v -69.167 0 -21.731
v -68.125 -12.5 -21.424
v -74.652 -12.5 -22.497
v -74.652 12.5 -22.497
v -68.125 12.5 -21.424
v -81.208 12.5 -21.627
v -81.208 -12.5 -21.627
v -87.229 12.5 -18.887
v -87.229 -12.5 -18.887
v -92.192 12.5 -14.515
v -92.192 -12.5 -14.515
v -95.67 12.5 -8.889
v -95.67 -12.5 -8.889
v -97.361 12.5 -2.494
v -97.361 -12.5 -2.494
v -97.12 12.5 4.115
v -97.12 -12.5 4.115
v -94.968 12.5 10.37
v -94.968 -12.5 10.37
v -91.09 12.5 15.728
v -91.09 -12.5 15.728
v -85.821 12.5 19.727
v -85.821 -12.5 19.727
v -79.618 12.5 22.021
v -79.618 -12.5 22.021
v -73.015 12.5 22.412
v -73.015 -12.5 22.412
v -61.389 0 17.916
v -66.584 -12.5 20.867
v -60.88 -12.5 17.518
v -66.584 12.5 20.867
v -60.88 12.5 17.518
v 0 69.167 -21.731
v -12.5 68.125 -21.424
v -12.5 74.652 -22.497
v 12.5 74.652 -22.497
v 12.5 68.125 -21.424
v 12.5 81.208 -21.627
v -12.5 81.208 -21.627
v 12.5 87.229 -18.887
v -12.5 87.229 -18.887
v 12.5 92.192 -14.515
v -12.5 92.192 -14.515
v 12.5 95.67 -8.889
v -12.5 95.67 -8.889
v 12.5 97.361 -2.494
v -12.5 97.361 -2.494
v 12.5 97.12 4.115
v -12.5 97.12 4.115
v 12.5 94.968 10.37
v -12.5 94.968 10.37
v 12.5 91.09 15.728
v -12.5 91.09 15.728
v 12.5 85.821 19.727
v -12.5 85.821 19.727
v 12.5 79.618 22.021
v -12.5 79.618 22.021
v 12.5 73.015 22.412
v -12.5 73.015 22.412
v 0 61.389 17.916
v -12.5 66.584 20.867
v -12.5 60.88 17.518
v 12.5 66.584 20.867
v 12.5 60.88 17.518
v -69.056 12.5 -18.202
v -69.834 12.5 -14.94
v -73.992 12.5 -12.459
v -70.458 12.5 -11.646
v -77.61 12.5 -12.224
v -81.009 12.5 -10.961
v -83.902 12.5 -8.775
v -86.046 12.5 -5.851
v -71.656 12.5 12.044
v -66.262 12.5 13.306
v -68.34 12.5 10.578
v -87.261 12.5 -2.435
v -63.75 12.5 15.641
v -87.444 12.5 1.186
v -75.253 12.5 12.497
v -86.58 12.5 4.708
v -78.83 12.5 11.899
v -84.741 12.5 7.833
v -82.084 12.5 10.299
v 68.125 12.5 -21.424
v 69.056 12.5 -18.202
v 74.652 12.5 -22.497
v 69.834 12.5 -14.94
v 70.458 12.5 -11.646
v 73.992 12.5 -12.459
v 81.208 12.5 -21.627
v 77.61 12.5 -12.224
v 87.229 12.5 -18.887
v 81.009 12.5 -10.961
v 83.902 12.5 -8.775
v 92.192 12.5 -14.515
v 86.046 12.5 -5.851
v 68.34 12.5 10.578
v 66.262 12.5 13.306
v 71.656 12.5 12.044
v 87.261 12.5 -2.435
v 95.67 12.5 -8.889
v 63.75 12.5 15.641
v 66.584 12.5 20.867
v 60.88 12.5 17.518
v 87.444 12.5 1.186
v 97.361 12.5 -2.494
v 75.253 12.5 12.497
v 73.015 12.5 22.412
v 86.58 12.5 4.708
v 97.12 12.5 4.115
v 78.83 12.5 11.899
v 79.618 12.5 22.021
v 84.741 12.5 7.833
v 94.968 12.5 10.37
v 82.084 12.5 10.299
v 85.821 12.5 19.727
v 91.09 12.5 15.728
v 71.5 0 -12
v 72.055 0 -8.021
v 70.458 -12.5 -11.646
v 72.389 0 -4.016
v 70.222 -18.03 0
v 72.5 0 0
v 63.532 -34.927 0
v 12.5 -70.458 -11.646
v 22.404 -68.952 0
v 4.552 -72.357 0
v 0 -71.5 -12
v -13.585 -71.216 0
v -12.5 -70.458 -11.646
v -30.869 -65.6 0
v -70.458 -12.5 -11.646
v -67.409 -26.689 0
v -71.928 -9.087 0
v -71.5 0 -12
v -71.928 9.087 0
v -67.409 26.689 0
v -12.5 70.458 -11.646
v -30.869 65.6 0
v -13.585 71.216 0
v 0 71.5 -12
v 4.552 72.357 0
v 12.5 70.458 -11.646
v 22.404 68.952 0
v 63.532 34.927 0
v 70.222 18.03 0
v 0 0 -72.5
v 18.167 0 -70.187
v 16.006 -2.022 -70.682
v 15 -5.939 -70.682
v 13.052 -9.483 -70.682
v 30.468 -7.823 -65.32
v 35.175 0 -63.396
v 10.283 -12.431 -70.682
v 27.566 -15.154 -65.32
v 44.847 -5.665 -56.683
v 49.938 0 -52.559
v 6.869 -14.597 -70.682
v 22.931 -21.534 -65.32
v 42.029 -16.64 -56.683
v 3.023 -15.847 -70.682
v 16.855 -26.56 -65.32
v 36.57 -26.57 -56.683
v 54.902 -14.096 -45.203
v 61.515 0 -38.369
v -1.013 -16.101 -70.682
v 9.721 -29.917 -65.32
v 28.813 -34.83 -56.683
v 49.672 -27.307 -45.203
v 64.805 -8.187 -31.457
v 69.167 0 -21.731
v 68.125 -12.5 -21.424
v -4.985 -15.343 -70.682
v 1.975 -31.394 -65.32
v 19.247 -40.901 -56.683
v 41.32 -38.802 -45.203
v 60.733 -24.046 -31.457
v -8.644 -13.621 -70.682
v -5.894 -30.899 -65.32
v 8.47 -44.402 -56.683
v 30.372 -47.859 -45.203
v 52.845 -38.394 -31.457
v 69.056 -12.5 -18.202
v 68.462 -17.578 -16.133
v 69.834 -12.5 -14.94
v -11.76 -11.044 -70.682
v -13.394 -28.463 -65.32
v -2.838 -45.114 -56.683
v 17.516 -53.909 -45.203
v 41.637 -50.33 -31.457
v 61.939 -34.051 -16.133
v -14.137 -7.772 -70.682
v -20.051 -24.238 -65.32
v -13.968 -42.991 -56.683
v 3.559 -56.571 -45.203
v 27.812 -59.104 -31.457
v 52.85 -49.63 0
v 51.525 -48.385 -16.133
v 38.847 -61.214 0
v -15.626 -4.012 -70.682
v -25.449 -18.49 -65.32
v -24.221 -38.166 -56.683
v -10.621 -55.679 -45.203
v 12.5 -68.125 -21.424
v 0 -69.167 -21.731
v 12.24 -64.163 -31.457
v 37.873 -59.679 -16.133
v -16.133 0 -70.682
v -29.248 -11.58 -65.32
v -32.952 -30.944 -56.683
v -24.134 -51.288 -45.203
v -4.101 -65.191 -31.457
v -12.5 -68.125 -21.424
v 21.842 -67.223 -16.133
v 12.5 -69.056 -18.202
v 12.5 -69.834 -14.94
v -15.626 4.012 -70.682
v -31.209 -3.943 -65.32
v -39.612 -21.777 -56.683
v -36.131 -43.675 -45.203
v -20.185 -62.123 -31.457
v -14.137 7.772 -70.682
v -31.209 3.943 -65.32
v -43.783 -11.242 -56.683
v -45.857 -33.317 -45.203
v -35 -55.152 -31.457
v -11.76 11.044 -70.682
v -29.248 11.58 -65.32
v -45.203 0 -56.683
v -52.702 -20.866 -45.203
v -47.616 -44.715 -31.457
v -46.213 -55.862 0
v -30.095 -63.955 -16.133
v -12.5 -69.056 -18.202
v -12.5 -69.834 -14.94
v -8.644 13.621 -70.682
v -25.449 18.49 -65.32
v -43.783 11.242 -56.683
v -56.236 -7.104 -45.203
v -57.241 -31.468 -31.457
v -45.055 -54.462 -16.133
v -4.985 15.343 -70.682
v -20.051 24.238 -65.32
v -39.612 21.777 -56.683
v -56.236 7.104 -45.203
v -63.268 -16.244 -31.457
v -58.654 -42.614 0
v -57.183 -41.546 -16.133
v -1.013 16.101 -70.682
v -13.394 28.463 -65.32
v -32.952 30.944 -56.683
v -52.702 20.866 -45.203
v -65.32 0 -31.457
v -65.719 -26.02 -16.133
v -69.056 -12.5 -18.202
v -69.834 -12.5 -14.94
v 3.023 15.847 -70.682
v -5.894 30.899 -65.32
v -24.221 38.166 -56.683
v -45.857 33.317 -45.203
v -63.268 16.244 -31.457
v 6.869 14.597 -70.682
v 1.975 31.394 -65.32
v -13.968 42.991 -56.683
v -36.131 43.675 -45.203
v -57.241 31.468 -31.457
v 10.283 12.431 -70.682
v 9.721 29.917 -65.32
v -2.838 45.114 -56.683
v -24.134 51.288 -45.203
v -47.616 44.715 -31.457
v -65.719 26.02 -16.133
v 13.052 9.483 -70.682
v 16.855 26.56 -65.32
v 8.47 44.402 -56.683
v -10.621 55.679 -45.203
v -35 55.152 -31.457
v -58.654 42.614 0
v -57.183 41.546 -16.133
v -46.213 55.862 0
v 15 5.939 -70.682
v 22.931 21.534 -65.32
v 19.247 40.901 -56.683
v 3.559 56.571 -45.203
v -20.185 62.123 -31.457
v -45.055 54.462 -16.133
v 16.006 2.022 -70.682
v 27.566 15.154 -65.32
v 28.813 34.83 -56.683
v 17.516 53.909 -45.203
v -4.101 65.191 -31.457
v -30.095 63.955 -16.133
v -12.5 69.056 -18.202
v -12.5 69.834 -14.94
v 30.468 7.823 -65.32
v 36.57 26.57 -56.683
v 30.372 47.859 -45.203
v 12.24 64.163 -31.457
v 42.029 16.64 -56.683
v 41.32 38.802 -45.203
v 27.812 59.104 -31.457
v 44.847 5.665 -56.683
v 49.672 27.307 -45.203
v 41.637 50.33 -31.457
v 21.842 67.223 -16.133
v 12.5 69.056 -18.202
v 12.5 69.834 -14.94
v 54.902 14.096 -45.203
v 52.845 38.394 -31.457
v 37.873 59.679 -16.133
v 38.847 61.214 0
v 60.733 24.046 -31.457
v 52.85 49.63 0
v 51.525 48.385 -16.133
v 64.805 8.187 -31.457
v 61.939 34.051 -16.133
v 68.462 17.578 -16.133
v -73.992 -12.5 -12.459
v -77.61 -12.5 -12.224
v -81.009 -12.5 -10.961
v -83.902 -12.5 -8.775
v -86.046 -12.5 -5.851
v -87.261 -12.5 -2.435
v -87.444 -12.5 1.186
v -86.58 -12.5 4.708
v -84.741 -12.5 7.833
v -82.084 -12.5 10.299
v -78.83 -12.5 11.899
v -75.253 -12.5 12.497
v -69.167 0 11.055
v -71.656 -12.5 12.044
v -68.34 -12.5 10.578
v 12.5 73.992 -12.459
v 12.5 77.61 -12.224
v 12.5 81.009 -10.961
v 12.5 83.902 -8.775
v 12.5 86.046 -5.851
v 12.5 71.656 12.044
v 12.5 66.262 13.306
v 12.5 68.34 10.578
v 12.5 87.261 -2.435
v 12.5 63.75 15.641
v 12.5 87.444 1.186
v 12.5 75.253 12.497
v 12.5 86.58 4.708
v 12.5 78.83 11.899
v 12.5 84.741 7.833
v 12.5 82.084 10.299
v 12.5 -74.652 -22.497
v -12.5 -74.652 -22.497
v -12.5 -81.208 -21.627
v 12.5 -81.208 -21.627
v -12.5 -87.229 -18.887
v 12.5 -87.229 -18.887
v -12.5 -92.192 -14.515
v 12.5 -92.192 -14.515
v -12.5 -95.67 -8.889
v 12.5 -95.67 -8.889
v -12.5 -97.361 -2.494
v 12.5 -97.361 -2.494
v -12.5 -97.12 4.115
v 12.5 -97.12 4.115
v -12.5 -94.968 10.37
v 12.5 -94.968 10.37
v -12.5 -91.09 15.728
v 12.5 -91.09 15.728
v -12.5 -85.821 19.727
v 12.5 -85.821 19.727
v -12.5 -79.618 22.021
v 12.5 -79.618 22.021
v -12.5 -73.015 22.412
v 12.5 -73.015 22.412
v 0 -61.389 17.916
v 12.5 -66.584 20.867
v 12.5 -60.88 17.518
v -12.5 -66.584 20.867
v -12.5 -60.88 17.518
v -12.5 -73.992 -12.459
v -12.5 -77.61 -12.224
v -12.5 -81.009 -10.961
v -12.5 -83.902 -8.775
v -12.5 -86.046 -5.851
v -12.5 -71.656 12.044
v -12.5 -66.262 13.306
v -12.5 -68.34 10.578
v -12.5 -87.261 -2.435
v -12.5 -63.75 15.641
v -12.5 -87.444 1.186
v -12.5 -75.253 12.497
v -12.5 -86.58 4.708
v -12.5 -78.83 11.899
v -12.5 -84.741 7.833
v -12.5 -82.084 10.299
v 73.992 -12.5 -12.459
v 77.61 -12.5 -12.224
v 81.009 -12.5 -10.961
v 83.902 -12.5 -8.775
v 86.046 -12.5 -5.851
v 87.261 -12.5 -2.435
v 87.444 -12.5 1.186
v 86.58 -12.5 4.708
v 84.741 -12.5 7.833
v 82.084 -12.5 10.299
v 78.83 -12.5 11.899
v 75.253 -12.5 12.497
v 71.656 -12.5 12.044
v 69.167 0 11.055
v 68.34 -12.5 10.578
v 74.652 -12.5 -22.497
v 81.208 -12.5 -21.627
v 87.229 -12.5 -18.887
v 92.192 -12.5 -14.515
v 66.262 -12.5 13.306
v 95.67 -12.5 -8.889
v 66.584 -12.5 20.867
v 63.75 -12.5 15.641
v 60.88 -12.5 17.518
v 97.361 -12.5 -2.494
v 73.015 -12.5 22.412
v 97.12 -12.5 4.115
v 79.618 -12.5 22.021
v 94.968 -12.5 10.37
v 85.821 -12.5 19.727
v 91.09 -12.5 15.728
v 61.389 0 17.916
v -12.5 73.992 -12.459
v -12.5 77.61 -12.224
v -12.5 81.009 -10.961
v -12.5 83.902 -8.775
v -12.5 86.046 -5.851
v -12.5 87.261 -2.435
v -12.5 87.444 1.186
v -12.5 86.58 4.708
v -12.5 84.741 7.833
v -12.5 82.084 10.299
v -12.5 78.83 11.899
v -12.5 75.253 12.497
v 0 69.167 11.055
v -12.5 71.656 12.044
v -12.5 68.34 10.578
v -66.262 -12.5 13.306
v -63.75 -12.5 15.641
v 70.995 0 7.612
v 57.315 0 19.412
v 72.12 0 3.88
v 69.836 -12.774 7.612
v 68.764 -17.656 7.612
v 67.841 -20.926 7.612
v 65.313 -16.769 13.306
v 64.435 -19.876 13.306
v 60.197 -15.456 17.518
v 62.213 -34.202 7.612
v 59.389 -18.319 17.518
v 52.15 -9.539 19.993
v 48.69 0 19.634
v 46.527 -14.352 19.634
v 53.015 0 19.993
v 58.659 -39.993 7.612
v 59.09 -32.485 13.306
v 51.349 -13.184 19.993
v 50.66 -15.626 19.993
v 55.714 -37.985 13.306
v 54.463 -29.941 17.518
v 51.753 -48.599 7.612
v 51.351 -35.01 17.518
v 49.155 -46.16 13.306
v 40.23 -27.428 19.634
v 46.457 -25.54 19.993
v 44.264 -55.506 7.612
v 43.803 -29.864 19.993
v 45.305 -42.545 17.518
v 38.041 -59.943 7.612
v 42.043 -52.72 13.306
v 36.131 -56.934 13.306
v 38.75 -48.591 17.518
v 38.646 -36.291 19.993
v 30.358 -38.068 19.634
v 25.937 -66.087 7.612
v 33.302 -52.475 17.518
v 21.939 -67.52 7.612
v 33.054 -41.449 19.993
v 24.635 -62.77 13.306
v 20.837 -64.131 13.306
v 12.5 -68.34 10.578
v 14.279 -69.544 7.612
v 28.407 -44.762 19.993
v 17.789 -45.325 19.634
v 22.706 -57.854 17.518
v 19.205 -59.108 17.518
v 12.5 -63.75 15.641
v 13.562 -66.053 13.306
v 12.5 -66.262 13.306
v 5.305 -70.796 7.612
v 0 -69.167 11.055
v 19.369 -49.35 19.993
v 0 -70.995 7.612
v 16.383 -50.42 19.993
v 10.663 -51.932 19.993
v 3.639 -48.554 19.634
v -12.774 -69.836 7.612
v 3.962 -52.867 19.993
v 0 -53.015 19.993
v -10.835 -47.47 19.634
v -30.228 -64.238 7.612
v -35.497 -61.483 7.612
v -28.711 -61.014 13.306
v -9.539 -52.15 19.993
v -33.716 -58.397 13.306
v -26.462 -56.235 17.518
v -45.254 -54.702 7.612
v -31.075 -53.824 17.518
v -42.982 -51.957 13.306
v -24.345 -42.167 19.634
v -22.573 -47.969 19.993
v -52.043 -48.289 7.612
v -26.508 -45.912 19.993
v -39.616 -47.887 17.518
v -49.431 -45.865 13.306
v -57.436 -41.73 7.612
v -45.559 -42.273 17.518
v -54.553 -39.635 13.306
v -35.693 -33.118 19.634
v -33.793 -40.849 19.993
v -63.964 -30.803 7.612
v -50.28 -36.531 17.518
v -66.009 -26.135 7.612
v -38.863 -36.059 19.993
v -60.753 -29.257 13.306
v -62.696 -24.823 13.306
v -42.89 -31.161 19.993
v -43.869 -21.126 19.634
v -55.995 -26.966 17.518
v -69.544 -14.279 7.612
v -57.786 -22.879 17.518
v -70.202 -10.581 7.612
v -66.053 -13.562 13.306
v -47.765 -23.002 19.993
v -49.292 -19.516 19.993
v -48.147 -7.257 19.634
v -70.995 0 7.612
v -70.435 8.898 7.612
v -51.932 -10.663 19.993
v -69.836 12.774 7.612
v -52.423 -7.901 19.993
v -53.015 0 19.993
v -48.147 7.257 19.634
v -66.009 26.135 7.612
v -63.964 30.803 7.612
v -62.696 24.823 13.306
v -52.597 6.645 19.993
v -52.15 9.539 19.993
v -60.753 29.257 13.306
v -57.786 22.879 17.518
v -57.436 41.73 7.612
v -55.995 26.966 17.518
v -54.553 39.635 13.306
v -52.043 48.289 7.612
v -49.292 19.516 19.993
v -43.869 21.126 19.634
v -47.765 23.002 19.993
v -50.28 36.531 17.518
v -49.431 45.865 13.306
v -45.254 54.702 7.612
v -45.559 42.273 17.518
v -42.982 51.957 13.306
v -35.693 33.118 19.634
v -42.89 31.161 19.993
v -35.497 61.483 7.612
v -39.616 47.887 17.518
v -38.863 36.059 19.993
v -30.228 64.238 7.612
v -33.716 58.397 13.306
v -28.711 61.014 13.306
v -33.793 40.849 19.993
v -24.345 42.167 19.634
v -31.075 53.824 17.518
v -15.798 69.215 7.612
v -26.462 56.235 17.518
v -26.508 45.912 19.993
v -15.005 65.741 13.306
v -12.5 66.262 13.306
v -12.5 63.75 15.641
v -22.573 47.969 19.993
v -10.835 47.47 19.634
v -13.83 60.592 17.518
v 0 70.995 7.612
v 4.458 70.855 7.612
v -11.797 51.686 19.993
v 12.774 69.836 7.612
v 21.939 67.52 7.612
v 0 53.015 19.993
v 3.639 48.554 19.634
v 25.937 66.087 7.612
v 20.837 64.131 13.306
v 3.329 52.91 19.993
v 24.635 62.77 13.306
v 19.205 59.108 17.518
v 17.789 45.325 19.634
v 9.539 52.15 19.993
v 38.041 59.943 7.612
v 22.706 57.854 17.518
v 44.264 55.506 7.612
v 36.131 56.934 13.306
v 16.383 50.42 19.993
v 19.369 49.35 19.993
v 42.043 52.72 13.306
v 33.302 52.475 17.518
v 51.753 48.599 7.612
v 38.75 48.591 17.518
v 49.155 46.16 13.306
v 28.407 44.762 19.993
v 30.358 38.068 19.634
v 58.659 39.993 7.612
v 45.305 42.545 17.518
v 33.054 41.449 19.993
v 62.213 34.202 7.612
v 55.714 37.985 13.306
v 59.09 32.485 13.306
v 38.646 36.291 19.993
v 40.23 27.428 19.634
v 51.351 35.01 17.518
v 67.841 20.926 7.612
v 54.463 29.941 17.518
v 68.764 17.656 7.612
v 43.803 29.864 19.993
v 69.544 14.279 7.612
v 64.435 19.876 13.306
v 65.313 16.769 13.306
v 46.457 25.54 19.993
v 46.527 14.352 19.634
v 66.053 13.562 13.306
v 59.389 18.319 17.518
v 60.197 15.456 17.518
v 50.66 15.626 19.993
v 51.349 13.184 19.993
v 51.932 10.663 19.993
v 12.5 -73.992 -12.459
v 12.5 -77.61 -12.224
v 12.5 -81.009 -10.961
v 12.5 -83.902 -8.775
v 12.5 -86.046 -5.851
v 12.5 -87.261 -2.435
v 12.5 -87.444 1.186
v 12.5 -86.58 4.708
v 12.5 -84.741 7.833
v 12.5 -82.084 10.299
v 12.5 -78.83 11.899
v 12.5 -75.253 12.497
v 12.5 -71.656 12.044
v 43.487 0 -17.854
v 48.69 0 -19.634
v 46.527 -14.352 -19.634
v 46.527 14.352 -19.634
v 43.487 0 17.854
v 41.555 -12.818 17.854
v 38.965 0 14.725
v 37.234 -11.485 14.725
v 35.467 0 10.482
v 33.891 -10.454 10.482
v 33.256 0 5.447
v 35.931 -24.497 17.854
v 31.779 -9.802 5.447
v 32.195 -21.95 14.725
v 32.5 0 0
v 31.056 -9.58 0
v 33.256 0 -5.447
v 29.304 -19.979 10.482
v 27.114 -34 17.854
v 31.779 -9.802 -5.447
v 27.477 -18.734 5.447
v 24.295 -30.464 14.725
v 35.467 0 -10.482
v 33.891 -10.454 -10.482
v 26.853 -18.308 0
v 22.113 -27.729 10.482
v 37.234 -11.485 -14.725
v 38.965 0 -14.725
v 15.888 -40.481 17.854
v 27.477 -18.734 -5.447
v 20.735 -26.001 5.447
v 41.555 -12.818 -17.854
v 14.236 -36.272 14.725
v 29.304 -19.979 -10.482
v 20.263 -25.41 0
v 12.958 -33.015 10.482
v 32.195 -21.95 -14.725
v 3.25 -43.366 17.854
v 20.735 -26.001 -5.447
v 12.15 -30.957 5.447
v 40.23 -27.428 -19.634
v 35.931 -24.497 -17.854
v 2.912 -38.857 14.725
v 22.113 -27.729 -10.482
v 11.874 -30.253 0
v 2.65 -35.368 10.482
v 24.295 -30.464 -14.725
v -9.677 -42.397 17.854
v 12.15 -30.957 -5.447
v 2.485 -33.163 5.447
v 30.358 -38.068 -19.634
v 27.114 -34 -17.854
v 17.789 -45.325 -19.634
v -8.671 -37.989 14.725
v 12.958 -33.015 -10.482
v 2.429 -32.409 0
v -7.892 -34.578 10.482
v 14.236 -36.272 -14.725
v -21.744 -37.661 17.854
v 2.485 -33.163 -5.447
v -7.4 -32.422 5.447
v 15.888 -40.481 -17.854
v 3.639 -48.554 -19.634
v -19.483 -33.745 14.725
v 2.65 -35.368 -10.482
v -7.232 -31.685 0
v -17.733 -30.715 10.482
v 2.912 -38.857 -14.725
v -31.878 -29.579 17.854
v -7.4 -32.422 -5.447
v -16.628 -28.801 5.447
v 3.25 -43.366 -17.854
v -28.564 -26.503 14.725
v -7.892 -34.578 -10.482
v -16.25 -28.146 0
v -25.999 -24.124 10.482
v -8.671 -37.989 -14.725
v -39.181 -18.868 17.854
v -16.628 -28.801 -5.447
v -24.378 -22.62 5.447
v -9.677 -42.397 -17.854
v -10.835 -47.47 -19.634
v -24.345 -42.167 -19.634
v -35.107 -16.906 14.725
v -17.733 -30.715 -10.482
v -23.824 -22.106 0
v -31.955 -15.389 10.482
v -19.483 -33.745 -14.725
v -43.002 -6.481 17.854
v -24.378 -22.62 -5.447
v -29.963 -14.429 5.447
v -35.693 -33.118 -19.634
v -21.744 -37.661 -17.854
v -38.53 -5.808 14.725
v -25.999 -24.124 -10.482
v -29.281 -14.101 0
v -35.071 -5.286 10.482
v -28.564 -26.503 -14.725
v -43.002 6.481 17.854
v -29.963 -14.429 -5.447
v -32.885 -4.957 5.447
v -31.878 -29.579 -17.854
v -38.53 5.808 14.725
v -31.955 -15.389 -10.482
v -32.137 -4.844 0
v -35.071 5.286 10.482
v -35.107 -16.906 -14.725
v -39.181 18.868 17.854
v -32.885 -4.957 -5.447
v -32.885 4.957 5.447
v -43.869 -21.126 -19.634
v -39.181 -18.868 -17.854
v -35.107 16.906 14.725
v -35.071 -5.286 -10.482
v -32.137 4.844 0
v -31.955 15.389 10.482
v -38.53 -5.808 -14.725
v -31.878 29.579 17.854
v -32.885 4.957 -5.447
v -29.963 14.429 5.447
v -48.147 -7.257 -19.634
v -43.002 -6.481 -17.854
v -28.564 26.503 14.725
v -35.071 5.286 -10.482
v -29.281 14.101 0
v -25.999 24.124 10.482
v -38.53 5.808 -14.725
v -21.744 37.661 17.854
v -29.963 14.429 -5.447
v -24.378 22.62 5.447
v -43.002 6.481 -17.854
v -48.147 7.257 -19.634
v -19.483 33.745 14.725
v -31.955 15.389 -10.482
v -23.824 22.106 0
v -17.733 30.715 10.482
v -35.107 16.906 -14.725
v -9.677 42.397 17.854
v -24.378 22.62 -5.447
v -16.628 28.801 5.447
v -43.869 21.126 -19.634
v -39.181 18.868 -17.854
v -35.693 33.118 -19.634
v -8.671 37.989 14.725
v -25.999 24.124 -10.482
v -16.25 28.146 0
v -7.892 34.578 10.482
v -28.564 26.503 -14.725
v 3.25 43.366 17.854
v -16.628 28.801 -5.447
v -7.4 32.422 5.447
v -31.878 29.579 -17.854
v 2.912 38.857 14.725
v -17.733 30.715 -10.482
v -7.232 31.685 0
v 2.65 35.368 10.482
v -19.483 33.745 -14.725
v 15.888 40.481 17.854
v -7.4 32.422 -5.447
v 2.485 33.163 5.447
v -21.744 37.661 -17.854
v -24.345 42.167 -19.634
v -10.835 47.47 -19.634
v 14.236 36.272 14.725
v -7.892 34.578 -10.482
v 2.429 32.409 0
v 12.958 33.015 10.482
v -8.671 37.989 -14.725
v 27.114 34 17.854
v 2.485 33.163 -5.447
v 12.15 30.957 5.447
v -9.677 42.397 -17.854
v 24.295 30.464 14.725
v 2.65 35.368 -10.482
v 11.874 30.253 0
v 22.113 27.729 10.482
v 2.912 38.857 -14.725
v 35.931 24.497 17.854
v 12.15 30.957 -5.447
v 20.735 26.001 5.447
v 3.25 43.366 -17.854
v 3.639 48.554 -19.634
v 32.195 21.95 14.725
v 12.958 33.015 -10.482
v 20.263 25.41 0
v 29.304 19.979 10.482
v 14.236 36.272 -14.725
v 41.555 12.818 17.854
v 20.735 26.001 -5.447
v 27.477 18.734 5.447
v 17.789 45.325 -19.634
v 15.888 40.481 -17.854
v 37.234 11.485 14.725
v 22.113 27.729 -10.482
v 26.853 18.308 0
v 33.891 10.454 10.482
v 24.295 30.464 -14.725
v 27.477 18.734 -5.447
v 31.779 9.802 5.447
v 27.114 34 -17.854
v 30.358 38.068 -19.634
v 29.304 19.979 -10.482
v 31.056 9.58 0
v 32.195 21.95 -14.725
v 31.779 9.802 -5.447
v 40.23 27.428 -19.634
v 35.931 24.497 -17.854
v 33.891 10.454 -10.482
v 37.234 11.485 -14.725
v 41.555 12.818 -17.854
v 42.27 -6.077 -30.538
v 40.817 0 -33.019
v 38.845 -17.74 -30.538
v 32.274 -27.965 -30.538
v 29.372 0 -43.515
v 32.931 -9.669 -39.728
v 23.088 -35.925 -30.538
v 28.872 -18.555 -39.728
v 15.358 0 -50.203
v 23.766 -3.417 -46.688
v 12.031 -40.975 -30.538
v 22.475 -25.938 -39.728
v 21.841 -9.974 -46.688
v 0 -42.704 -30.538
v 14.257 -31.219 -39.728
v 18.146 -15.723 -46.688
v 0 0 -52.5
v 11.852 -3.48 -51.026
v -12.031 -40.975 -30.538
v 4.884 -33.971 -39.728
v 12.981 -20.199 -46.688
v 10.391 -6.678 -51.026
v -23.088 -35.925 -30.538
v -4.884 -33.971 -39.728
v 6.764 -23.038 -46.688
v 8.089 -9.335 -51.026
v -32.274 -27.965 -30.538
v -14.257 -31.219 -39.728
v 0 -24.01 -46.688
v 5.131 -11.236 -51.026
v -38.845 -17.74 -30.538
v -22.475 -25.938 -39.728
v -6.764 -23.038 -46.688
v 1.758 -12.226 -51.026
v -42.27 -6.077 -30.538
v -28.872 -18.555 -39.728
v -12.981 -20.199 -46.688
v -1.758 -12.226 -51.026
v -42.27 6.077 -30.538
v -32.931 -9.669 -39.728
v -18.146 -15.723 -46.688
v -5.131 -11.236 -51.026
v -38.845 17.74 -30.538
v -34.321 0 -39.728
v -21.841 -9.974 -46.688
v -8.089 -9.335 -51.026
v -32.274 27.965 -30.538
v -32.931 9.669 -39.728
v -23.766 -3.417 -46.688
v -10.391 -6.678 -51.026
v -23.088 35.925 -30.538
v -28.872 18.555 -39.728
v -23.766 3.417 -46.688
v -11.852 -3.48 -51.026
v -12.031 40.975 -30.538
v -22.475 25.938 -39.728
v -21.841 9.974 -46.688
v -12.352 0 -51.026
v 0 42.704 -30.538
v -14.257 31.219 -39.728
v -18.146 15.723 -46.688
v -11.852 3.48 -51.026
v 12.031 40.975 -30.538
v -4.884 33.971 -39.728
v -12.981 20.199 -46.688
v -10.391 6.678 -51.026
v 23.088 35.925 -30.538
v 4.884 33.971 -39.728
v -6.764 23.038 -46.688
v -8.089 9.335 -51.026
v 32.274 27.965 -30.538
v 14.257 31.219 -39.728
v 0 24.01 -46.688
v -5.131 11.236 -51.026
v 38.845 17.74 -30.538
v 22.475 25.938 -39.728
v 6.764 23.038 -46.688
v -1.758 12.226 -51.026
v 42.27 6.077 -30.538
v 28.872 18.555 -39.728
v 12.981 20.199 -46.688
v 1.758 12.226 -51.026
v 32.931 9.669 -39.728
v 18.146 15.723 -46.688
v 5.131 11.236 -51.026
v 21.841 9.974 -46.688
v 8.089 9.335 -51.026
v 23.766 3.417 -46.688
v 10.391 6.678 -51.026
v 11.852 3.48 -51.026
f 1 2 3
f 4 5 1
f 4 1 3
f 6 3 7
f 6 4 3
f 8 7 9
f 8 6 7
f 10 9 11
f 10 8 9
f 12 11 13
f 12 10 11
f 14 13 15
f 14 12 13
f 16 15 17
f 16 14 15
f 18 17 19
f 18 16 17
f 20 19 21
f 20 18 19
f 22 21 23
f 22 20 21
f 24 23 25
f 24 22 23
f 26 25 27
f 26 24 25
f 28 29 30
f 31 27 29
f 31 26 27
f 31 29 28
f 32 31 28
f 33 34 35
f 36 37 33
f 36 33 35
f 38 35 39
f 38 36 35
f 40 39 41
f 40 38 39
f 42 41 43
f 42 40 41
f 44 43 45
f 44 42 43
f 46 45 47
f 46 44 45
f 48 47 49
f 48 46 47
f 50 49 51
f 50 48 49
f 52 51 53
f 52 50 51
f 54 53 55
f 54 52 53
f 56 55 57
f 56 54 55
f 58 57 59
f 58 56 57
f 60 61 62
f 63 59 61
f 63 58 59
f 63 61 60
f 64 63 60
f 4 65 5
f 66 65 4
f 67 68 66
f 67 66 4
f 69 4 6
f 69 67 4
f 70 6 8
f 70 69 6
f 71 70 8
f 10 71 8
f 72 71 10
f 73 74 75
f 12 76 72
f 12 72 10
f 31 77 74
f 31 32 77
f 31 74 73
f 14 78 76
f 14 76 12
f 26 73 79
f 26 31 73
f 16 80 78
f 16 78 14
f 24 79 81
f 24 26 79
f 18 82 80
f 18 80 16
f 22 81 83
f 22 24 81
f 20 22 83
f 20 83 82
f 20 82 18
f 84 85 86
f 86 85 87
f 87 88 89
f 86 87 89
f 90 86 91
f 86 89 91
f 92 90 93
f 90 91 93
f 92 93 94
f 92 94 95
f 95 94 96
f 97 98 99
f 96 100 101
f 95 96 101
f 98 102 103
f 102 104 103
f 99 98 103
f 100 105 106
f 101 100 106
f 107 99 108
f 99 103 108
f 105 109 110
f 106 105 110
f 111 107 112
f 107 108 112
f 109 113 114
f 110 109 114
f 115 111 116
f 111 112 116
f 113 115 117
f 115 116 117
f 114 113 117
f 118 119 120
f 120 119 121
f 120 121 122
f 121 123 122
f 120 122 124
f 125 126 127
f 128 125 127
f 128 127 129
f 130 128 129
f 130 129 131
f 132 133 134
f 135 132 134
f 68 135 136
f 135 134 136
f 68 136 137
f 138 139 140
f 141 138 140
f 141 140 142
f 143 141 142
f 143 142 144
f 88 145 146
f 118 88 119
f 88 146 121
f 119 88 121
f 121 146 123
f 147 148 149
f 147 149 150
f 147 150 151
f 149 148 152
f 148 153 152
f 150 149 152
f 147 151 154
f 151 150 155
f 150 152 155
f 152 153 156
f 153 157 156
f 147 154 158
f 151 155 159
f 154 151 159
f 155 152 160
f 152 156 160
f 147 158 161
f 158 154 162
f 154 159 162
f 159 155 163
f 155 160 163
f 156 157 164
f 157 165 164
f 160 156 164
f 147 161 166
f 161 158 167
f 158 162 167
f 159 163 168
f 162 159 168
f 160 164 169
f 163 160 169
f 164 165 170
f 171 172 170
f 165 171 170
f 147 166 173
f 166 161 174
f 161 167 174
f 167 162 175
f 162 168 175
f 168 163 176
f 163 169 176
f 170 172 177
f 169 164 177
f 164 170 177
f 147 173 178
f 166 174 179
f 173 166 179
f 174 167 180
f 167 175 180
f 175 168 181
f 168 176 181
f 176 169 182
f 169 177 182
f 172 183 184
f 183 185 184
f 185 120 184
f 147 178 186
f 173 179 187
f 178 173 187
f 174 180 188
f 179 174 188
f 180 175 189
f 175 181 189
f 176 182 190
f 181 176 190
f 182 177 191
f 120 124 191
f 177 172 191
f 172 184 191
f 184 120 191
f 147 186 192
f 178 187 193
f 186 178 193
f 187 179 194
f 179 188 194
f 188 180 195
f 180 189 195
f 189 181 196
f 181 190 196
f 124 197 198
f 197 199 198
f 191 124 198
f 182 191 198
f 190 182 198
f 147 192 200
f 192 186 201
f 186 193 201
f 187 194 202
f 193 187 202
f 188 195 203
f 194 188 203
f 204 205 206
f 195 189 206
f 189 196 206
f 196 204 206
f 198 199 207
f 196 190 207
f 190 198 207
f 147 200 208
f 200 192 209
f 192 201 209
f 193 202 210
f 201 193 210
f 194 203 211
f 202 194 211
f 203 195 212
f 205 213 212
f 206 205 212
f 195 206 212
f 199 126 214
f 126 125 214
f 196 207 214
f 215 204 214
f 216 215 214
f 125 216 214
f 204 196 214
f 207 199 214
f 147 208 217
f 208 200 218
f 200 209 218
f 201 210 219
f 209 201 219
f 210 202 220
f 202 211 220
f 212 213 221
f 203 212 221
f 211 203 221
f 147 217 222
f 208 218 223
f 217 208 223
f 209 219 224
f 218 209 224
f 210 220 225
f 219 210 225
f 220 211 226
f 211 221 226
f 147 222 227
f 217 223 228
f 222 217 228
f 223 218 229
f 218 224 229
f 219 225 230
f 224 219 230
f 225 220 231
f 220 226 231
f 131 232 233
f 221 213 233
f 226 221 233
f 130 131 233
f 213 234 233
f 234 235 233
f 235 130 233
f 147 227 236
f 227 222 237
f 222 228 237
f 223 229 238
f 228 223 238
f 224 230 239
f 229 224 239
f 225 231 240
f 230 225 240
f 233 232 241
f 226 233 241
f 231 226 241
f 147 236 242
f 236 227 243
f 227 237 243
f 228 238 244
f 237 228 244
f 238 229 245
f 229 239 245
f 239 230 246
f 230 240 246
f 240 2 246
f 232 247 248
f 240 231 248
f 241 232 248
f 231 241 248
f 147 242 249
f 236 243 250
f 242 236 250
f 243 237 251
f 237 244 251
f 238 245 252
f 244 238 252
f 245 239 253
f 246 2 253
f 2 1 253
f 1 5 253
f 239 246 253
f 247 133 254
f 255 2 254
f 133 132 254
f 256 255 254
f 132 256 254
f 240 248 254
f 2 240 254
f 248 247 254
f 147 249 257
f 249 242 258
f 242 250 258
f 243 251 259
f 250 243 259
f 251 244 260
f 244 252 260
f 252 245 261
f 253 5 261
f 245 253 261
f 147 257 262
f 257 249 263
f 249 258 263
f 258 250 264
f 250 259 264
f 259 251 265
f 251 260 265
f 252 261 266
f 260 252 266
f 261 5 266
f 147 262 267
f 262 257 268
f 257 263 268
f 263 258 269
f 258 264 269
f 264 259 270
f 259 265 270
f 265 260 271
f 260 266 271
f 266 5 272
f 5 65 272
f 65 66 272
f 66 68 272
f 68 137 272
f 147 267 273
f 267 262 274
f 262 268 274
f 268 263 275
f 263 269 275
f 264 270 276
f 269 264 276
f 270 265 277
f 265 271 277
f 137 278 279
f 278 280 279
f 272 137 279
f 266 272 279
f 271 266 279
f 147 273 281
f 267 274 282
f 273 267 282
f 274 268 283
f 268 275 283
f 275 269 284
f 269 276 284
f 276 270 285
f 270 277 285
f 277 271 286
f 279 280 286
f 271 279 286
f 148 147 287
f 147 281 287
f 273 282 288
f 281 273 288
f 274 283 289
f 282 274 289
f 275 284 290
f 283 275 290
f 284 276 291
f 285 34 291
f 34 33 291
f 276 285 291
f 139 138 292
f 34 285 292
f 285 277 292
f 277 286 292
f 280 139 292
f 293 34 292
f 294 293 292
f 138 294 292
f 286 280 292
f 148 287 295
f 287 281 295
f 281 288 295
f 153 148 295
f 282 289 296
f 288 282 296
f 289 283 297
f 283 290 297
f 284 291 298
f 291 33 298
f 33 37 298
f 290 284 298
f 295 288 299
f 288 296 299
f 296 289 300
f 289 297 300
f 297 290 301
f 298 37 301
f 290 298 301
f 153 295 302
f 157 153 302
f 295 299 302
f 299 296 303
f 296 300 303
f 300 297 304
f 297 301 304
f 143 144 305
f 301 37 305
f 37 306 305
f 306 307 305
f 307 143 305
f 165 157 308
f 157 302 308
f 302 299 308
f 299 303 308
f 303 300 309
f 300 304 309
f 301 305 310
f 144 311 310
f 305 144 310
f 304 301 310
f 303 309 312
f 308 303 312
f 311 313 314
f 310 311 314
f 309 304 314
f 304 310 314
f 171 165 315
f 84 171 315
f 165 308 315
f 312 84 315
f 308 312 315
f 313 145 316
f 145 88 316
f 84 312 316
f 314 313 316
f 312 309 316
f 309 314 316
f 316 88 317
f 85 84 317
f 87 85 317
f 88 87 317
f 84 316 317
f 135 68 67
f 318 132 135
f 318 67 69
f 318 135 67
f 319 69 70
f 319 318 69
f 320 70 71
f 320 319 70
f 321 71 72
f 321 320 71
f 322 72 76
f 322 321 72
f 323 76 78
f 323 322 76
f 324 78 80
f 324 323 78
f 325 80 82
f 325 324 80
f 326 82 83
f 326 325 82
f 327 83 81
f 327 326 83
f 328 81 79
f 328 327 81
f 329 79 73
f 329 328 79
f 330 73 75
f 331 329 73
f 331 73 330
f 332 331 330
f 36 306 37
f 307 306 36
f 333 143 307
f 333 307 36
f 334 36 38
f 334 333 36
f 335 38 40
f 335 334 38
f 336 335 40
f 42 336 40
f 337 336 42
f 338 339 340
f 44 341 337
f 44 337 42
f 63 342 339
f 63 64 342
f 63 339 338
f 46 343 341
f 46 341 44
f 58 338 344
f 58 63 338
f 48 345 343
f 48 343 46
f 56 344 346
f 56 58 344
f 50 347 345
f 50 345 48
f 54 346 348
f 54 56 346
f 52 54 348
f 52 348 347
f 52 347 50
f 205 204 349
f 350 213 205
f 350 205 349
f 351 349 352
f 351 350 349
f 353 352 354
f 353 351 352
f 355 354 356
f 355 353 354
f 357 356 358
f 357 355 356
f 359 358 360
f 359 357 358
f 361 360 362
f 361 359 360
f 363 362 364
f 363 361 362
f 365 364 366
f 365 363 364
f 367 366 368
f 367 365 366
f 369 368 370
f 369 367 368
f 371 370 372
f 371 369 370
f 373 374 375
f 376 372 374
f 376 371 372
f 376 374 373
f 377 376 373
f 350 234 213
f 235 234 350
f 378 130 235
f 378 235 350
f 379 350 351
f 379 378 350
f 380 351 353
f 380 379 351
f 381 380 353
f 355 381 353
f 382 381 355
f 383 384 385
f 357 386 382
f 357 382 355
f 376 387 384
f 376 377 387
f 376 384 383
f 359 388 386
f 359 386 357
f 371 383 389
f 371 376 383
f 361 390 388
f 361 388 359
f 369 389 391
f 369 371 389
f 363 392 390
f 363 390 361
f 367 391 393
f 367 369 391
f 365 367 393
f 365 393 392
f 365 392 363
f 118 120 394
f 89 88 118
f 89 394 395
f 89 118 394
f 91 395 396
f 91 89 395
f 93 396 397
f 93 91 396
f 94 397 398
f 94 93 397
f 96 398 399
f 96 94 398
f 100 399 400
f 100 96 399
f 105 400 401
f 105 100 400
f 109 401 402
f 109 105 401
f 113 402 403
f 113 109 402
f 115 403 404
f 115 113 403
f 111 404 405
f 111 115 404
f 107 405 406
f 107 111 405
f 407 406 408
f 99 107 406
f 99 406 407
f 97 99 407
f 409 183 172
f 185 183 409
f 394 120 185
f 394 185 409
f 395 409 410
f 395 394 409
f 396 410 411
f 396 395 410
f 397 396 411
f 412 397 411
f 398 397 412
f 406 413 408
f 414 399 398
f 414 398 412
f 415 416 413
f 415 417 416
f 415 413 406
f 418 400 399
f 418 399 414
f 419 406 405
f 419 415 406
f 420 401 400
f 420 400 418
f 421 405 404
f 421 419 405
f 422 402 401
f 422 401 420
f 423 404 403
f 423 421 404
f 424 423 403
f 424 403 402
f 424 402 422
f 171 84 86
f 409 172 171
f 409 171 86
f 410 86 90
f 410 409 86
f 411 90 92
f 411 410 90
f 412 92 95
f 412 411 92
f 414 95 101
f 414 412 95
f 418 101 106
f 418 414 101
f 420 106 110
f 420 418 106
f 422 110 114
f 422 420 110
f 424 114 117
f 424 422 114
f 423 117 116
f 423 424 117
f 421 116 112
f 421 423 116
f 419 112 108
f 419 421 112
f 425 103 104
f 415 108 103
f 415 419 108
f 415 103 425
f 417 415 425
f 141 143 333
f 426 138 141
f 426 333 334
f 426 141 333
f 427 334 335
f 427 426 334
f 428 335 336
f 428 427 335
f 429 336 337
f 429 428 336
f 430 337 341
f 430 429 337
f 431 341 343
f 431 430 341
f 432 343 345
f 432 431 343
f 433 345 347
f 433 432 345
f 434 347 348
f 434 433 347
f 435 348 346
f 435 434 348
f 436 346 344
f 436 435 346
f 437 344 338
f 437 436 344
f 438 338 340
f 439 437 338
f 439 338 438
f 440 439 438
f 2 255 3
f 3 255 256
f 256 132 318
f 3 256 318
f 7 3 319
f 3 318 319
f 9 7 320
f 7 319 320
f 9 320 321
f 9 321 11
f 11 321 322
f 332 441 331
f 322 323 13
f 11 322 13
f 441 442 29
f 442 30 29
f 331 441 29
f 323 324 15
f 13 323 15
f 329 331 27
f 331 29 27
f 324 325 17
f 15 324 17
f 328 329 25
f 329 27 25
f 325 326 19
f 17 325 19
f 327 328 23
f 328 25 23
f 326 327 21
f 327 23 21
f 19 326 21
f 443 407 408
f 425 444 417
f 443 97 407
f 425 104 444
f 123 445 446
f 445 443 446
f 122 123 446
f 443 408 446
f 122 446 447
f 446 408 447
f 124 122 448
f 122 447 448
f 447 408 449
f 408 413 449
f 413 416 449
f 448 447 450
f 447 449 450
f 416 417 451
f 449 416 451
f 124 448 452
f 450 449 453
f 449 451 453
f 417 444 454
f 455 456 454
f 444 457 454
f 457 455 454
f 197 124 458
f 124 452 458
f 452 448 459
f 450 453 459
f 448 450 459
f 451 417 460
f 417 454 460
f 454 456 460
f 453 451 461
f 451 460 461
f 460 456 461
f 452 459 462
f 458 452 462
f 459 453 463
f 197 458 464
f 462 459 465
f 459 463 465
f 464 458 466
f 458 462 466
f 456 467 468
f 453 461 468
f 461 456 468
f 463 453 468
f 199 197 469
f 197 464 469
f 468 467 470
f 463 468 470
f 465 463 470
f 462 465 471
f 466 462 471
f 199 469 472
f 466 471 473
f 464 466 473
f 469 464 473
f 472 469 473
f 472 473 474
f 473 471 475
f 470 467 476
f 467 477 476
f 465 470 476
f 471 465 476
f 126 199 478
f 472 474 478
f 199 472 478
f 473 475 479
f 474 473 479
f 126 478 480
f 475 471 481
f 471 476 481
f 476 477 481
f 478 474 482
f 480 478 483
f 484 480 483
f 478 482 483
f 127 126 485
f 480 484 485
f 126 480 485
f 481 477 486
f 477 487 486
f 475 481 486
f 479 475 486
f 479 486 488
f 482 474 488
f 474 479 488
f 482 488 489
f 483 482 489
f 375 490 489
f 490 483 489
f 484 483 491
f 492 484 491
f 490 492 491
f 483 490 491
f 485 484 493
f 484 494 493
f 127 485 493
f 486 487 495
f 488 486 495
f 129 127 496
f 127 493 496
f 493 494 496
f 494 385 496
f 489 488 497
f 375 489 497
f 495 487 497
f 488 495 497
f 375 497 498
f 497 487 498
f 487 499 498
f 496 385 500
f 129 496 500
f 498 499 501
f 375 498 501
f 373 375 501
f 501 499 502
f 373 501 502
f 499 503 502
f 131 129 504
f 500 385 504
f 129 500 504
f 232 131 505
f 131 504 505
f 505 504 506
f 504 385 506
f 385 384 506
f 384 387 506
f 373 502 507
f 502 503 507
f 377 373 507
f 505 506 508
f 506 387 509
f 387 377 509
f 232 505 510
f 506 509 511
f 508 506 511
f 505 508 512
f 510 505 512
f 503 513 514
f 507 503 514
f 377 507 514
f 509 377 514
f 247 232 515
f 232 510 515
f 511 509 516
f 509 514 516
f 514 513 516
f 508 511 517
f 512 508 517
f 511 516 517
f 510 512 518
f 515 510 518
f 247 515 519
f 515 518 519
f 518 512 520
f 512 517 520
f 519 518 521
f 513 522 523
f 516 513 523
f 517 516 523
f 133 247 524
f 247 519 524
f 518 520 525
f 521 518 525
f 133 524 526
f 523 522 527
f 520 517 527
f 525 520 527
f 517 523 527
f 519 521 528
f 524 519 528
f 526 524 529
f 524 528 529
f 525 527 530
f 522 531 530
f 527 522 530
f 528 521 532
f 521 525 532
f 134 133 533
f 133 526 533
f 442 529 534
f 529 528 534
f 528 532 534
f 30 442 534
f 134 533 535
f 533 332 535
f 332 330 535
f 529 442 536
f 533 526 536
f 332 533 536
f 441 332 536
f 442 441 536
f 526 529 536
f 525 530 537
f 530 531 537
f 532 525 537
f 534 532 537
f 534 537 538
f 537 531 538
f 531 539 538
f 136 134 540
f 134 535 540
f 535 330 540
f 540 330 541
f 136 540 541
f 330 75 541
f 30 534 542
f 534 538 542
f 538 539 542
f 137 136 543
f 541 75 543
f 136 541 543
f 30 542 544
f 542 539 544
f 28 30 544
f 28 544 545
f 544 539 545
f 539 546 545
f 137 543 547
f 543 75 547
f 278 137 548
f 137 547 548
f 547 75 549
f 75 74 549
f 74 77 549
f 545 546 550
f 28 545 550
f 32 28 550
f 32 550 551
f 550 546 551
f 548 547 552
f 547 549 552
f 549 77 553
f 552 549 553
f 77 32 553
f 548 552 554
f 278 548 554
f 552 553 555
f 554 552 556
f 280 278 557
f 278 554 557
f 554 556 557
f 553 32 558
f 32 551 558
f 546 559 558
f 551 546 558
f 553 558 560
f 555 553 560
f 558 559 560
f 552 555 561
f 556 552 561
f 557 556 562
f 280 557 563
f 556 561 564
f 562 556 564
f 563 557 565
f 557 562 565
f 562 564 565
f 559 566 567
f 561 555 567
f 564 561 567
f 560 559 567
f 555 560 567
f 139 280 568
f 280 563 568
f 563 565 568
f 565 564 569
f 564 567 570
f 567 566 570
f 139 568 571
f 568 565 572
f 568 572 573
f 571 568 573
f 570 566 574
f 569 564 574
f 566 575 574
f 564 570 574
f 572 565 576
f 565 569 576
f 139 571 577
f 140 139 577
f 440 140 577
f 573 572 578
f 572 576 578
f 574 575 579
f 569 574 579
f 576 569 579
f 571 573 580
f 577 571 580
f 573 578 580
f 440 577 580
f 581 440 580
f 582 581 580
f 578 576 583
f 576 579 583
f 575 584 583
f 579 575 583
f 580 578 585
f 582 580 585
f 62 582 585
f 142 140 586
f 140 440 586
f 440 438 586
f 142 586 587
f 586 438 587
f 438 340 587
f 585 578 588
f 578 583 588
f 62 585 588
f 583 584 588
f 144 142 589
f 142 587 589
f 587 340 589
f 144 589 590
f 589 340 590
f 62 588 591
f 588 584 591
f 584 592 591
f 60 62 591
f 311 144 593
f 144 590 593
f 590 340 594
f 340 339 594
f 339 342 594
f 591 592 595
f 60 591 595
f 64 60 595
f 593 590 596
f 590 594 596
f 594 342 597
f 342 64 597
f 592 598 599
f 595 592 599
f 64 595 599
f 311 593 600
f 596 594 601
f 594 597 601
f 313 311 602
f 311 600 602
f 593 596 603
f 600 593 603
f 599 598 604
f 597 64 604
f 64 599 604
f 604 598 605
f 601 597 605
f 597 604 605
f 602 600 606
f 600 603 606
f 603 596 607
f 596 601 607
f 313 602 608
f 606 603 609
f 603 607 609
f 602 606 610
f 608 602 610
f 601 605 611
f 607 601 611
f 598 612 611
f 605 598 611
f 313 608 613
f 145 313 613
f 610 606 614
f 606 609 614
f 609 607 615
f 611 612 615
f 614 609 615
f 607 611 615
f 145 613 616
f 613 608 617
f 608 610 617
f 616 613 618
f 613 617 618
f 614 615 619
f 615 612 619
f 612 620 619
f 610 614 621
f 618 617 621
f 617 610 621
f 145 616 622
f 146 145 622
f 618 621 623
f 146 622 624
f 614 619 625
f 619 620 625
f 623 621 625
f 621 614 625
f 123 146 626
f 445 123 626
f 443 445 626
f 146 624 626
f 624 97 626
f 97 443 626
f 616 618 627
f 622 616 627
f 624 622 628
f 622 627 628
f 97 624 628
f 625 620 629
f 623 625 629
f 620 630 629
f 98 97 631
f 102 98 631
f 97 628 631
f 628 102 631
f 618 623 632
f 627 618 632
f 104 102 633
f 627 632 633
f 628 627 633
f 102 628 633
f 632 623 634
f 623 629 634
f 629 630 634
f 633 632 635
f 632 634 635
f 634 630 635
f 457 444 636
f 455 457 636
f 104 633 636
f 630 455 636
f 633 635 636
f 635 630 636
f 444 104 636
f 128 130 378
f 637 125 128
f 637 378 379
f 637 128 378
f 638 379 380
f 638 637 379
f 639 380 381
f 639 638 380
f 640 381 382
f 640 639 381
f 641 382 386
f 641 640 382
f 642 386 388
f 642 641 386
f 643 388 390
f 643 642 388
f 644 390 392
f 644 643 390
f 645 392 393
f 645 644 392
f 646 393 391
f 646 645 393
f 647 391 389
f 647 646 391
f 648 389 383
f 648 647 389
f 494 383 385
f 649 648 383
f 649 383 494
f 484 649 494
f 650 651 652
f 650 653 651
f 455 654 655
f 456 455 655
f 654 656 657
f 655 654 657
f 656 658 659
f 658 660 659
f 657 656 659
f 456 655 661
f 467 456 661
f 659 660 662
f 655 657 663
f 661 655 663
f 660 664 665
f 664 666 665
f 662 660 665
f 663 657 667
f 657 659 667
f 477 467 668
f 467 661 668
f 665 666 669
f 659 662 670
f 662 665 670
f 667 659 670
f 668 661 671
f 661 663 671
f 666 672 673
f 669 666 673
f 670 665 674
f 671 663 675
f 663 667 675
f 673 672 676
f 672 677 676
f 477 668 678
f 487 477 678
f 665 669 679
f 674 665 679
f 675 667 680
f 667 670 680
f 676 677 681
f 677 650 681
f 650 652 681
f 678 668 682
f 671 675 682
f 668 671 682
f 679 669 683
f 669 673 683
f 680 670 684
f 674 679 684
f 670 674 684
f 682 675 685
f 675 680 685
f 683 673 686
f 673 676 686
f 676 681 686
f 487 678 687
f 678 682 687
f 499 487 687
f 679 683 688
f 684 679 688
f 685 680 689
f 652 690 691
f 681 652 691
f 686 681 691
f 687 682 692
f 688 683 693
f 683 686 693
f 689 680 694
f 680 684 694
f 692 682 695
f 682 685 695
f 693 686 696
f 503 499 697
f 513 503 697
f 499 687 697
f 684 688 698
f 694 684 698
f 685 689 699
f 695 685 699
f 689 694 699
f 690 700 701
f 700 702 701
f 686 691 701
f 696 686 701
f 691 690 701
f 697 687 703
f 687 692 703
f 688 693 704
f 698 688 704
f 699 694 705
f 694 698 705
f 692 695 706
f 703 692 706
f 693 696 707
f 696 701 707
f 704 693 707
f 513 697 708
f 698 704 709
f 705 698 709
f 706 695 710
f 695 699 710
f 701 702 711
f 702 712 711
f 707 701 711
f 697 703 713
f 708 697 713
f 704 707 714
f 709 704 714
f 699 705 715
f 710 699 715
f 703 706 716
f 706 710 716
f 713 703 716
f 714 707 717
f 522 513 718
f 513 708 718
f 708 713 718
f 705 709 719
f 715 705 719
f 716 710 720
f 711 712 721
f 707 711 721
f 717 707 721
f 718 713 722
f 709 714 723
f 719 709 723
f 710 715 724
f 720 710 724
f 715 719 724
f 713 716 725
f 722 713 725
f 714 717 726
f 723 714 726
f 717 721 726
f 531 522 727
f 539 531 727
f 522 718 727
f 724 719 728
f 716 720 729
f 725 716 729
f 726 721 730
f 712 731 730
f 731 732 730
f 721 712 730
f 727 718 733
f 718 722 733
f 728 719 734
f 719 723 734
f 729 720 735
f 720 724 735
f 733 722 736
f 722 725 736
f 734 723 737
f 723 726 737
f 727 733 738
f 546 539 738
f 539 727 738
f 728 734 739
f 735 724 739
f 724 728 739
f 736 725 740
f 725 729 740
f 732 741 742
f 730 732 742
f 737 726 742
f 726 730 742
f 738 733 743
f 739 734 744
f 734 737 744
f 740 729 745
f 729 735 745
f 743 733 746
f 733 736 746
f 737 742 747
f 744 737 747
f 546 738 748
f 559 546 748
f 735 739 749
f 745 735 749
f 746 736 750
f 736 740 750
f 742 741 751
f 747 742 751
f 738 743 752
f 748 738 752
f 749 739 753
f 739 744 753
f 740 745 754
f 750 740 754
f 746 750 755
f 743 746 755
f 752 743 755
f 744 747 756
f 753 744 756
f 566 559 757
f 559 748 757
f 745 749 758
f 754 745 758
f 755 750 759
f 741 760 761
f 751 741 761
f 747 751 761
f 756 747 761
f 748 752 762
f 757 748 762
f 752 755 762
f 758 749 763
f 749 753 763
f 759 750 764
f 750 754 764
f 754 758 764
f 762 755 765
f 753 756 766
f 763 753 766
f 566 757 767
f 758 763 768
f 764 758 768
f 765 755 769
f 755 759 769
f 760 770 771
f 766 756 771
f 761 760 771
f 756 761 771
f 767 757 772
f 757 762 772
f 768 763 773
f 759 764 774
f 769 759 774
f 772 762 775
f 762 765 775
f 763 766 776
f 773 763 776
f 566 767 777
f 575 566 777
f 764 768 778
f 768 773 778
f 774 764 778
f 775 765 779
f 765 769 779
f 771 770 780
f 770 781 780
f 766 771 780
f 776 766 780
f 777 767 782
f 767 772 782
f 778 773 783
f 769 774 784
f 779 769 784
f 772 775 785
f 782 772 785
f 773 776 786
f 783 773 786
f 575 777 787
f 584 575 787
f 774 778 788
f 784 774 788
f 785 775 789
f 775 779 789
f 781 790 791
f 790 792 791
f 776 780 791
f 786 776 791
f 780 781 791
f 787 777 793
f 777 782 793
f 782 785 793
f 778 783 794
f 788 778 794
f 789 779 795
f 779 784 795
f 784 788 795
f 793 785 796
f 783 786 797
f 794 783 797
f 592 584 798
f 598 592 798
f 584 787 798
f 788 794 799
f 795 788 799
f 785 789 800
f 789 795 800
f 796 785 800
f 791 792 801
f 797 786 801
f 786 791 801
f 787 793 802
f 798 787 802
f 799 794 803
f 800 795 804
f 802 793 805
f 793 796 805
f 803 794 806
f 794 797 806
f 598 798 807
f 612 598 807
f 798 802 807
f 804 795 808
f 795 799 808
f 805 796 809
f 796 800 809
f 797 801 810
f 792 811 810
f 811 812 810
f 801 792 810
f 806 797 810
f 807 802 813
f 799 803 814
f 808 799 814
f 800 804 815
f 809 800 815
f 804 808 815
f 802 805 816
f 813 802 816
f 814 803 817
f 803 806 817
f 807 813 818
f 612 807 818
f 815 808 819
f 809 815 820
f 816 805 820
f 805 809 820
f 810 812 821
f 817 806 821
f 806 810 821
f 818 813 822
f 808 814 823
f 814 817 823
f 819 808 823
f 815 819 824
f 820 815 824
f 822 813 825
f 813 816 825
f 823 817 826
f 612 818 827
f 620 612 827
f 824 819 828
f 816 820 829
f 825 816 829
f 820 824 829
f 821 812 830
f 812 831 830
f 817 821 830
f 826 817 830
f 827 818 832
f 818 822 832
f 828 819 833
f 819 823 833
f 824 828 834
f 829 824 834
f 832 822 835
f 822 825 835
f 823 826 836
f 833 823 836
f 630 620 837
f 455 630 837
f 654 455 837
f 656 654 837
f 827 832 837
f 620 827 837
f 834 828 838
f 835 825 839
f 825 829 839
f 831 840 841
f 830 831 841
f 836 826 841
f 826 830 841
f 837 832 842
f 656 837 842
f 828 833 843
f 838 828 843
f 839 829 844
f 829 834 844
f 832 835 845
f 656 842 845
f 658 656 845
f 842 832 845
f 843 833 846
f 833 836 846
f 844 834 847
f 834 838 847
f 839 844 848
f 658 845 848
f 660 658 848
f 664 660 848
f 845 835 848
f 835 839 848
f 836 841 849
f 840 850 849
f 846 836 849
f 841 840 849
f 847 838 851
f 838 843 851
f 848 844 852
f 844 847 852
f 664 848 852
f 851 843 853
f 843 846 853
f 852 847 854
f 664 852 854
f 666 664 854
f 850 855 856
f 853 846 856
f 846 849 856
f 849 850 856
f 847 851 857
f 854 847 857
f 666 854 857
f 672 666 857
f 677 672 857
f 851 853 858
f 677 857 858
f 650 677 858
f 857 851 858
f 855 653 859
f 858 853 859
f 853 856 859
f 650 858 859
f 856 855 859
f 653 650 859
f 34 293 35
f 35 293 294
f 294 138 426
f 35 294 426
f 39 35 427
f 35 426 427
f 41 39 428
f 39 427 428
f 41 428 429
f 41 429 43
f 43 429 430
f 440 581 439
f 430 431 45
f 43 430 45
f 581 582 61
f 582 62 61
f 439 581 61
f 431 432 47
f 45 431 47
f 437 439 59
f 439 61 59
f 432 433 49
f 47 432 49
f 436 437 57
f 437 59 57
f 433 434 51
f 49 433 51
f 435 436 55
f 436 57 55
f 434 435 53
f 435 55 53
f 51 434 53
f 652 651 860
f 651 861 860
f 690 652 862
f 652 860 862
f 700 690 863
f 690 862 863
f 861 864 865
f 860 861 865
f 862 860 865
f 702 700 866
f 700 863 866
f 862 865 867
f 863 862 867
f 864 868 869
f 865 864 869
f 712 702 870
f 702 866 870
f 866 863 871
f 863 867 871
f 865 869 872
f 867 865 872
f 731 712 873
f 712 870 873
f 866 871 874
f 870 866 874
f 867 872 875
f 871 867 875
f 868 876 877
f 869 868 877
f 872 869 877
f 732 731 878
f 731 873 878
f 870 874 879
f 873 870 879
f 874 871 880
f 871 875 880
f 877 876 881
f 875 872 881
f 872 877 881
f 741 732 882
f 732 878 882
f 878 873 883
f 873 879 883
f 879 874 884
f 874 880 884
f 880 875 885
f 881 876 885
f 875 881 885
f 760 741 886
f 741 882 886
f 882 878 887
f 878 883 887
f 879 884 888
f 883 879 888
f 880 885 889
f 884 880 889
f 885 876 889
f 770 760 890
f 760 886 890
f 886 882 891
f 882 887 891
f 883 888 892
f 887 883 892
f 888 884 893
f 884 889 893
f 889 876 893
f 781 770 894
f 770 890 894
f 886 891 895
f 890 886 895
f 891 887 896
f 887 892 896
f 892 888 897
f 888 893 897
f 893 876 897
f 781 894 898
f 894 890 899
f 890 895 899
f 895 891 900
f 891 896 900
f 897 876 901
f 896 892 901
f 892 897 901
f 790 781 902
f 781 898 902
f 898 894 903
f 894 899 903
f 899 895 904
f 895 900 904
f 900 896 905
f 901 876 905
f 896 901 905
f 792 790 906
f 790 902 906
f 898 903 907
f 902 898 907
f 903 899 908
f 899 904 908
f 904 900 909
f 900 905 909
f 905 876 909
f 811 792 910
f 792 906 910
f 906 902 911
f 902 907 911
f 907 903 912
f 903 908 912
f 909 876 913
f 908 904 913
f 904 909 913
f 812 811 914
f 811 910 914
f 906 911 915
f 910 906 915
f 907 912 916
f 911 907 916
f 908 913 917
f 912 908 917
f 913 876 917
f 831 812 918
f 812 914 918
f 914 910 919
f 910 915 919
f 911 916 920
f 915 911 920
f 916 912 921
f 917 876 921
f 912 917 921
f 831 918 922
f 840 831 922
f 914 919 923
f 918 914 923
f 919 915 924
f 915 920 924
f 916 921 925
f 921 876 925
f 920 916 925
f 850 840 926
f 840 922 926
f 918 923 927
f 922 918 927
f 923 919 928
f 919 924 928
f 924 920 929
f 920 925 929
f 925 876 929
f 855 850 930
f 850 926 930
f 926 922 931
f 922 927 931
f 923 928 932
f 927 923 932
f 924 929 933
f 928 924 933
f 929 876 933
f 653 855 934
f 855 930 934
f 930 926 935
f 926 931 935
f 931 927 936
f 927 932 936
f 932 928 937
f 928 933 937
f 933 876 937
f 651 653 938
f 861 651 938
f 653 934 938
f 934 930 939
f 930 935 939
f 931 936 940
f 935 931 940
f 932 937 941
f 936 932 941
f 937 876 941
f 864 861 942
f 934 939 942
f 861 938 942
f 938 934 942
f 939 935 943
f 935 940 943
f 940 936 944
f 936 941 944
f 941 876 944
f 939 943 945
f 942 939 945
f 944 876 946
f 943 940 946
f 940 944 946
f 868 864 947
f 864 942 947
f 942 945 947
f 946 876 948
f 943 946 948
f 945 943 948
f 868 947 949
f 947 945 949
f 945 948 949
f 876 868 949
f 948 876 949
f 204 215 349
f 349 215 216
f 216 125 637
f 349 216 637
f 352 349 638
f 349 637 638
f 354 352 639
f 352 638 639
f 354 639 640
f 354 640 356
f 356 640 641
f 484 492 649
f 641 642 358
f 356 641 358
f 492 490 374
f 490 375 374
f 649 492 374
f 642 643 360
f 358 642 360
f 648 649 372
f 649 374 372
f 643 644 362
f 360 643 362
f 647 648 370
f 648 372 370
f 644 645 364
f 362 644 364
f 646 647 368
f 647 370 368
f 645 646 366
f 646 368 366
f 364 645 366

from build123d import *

# Parameters (mm, degrees)
F2_R     = 22.5
F2_R_2   = 12.5
F3_DEPTH = 12.5
F4_COUNT = 4
F4_ANGLE = 270


with BuildPart() as f1:
    # F0 (on Front) → F1 (revolve)
    with BuildSketch(Plane.XZ):
        with BuildLine():
            ThreePointArc((0, -72.5), (51.265241636, -51.265241636), (72.5, 0))
            ThreePointArc((72.5, 0), (65.2241802056, 15.4303349962), (48.6904761905, 19.6338363125))
            ThreePointArc((48.6904761905, 19.6338363125), (32.5, 0), (48.6904761905, -19.6338363125))
            ThreePointArc((48.6904761905, -19.6338363125), (29.3723815309, -43.5145171546), (0, -52.5))
            Line((0, -52.5), (0, -72.5))
        make_face()
    revolve(axis=Axis((0, 0, 0), (0, 0, -1)))

    # F2 (on Right) → F3 (join, symmetric)
    with BuildSketch(Plane.YZ):
        with Locations((75, 0)):
            Circle(F2_R)
        with Locations((75, 0)):
            Circle(F2_R_2, mode=Mode.SUBTRACT)
    extrude(amount=F3_DEPTH, both=True)

    # F4: F1 ×4 about axis
    f4_axis = Axis((0, 0, 0), (0, 0, -1))


with BuildPart() as f1_1:
    add(f1.part)
    for i in range(1, F4_COUNT):
        add(f1.part.rotate(f4_axis, i * F4_ANGLE / (F4_COUNT - 1)))


solid = f1_1.part
